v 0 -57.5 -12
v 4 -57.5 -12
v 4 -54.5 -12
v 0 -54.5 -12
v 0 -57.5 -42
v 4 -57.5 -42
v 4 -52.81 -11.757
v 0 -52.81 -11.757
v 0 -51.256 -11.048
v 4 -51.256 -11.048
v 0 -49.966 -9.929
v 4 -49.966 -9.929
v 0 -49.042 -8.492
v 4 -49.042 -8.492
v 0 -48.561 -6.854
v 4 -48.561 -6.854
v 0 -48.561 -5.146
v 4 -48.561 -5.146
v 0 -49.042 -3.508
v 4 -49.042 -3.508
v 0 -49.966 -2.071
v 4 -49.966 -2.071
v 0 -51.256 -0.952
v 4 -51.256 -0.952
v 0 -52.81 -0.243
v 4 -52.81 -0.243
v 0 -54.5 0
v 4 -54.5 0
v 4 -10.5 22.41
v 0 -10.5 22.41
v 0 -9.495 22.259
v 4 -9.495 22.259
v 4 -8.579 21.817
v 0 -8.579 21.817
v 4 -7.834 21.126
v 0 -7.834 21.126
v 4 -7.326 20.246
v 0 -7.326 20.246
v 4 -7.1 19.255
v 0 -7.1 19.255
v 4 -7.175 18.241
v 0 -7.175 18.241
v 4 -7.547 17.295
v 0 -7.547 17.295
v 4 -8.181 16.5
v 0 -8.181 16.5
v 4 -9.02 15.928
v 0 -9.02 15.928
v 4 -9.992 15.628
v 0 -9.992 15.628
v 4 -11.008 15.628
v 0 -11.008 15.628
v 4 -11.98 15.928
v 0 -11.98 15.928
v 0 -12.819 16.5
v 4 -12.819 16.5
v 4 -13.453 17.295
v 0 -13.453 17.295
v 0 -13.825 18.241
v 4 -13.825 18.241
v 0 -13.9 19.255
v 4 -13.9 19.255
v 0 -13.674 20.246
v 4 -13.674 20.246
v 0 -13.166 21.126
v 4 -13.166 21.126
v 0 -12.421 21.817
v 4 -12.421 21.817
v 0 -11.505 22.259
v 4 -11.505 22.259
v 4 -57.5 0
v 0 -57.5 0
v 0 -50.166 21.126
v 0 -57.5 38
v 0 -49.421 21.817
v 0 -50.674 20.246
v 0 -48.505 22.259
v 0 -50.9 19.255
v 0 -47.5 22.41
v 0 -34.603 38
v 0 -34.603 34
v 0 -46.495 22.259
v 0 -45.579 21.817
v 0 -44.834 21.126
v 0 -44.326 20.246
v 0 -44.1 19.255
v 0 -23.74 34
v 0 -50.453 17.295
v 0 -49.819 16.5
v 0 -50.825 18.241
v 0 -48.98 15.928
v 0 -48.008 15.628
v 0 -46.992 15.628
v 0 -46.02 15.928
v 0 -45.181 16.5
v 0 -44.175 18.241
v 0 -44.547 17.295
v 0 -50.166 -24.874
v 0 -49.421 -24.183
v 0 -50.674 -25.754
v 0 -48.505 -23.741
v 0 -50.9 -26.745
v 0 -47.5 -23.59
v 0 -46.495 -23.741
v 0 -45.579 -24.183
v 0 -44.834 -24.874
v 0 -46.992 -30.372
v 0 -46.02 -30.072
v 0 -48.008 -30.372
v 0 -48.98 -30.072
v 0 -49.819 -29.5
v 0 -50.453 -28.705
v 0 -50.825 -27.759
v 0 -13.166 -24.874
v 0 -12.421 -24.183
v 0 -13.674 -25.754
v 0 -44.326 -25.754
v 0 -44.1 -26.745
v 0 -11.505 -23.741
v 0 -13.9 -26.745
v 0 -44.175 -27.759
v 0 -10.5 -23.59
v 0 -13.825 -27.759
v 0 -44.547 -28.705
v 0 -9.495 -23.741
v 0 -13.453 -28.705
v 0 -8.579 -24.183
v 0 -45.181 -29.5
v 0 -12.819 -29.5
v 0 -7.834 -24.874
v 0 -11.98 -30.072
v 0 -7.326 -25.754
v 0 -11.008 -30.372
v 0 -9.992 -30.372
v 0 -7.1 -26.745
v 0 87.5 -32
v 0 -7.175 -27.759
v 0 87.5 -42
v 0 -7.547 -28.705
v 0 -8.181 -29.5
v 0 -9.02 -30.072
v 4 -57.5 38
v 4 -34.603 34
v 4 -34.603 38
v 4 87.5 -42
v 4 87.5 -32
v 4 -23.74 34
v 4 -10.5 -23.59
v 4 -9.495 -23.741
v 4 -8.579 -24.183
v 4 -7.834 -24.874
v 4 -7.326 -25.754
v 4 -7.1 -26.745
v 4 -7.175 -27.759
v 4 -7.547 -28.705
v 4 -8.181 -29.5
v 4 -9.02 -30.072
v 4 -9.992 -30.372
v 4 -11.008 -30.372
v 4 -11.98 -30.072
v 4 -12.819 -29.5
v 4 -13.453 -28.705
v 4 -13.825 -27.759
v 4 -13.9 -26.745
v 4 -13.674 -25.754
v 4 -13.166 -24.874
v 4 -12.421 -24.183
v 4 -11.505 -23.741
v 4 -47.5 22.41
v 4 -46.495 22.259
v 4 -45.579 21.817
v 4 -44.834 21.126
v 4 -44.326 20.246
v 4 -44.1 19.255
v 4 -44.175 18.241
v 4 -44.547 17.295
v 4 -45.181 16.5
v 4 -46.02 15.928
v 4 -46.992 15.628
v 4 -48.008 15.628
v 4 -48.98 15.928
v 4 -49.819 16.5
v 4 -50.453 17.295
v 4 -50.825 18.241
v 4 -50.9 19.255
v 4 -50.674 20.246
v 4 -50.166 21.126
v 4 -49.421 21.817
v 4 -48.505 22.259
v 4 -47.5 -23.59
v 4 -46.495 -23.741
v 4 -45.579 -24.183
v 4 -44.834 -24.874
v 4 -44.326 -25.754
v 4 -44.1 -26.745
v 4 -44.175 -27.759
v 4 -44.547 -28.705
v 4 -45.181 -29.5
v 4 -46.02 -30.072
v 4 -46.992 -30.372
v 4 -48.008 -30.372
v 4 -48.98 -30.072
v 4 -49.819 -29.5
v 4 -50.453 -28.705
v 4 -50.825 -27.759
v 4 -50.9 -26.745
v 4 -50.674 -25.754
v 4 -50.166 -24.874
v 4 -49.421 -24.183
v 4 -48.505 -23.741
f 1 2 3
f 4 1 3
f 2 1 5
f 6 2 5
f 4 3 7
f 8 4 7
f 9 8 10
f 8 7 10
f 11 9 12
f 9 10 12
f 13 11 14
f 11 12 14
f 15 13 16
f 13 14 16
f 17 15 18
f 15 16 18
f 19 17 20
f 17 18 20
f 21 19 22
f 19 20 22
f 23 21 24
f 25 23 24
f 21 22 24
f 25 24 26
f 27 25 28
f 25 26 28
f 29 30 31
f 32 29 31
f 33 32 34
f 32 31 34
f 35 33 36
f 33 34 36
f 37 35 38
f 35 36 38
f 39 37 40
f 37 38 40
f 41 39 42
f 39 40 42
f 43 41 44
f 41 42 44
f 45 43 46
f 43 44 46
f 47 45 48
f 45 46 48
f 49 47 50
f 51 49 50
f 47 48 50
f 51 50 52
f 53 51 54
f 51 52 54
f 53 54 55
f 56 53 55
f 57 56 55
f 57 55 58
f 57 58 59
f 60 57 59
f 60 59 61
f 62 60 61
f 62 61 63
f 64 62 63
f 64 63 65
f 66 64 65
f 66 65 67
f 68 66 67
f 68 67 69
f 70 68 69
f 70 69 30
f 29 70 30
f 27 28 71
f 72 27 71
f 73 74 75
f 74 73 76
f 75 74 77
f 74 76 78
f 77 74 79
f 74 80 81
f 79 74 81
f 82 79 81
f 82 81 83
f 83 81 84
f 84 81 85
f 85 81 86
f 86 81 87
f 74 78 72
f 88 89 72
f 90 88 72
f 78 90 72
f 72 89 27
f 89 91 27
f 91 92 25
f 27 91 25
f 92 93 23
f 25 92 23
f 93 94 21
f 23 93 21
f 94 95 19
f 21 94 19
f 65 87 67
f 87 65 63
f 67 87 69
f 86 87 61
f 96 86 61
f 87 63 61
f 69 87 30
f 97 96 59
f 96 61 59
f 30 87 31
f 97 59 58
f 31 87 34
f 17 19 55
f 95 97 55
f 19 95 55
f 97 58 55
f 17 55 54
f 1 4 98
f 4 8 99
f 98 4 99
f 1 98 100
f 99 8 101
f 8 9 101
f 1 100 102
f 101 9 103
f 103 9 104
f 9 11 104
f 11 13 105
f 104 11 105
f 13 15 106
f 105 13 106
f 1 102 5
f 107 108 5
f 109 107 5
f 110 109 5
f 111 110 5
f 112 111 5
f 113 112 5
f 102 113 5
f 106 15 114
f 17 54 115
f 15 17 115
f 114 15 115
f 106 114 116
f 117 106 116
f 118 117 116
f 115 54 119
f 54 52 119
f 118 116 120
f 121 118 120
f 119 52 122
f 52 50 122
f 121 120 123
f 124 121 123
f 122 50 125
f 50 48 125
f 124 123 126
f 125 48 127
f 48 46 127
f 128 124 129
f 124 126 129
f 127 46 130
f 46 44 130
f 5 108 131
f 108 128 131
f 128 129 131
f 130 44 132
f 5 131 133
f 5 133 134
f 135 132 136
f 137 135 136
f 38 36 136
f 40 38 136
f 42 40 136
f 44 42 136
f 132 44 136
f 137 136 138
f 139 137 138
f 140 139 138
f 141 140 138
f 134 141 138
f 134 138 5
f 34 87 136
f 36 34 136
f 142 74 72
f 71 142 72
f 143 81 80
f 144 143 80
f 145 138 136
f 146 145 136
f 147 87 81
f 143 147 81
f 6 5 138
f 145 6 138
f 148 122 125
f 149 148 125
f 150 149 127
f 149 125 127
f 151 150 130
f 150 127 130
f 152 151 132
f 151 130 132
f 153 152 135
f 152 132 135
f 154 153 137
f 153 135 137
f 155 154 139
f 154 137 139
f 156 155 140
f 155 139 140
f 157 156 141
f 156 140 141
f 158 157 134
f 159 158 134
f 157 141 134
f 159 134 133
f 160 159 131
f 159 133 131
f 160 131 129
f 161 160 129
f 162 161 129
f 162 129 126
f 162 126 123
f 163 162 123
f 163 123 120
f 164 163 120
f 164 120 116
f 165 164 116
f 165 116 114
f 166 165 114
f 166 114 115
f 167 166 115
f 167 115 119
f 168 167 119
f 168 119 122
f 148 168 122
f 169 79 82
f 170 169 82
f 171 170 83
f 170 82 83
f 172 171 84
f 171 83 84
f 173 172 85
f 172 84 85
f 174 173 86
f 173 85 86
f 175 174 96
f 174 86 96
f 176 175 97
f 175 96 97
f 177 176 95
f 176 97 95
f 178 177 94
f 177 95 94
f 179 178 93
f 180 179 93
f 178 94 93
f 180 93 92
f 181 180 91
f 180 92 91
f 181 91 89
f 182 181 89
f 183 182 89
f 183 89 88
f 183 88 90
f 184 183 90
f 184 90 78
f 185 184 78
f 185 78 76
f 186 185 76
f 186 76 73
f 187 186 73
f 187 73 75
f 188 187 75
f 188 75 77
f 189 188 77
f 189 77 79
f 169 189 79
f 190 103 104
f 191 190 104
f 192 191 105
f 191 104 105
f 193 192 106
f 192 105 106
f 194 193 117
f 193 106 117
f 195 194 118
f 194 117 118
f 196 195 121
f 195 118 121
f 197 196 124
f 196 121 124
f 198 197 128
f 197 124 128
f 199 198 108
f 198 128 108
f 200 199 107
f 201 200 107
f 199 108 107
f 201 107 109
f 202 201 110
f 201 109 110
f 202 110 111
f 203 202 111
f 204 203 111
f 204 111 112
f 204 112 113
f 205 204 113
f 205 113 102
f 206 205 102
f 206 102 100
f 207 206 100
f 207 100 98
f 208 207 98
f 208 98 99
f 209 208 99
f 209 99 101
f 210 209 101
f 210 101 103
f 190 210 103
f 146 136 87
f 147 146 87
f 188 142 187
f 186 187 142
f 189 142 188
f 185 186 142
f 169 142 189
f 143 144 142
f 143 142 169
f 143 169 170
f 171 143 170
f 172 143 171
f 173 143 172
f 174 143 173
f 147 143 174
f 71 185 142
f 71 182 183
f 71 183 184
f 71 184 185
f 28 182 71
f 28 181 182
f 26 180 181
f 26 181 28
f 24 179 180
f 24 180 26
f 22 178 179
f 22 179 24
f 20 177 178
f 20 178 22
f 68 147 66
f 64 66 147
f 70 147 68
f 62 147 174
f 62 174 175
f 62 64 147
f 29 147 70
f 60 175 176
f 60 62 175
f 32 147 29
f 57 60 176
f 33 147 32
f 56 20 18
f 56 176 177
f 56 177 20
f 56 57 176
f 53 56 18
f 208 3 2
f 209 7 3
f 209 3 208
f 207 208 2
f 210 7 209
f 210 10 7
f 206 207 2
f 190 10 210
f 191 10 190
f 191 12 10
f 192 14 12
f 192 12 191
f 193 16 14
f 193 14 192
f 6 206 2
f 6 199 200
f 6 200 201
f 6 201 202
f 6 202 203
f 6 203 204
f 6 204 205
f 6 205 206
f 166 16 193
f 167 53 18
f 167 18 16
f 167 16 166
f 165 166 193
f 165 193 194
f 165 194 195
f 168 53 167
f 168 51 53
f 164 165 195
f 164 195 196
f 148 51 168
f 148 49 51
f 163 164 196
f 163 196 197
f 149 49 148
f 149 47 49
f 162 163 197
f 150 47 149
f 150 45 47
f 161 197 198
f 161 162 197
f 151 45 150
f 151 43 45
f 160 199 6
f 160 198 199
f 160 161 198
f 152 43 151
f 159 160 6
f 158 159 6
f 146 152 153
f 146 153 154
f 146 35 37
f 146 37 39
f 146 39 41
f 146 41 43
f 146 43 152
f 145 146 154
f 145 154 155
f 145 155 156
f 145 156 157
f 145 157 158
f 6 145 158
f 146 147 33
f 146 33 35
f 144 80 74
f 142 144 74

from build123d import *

# Parameters (mm, degrees)
BOSS_EXTRUDE1_DEPTH = 4
CUT_EXTRUDE1_REACH  = 99.14
SKETCH3_R           = 3.41
CUT_EXTRUDE2_REACH  = 99.14
SKETCH4_R           = 3.41
CUT_EXTRUDE4_REACH  = 99.14


with BuildPart() as part:
    # Sketch1 → Boss-Extrude1 (new body)
    with BuildSketch(Plane(origin=(0, 0, 0), x_dir=(0, 0, -1), z_dir=(1, 0, 0))):
        Polygon((-38, -57.5), (42, -57.5), (42, 87.5), (32, 87.5), (-34, -23.740343039), (-34, -34.602813771), (-38, -34.602813771), align=None)
    extrude(amount=BOSS_EXTRUDE1_DEPTH)

    # Sketch3 → Cut-Extrude1 (cut, up to next)
    with BuildSketch(Plane.ZY, mode=Mode.PRIVATE) as cut_extrude1_sk1:
        with Locations((-27, -10.5)):
            Circle(SKETCH3_R)
    cut_extrude1_tool1 = extrude(cut_extrude1_sk1.sketch, amount=-CUT_EXTRUDE1_REACH, mode=Mode.PRIVATE) & part.part
    # Sketch3 → Cut-Extrude1 (cut, up to next)
    with BuildSketch(Plane.ZY, mode=Mode.PRIVATE) as cut_extrude1_sk2:
        with Locations((19, -10.5)):
            Circle(SKETCH3_R)
    cut_extrude1_tool2 = extrude(cut_extrude1_sk2.sketch, amount=-CUT_EXTRUDE1_REACH, mode=Mode.PRIVATE) & part.part
    add(cut_extrude1_tool1.solids().sort_by_distance((0, -10.5, -27))[0], mode=Mode.SUBTRACT)
    add(cut_extrude1_tool2.solids().sort_by_distance((0, -10.5, 19))[0], mode=Mode.SUBTRACT)

    # Sketch4 → Cut-Extrude2 (cut, up to next)
    with BuildSketch(Plane.ZY, mode=Mode.PRIVATE) as cut_extrude2_sk1:
        with Locations((-27, -47.5)):
            Circle(SKETCH4_R)
    cut_extrude2_tool1 = extrude(cut_extrude2_sk1.sketch, amount=-CUT_EXTRUDE2_REACH, mode=Mode.PRIVATE) & part.part
    # Sketch4 → Cut-Extrude2 (cut, up to next)
    with BuildSketch(Plane.ZY, mode=Mode.PRIVATE) as cut_extrude2_sk2:
        with Locations((19, -47.5)):
            Circle(SKETCH4_R)
    cut_extrude2_tool2 = extrude(cut_extrude2_sk2.sketch, amount=-CUT_EXTRUDE2_REACH, mode=Mode.PRIVATE) & part.part
    add(cut_extrude2_tool1.solids().sort_by_distance((0, -47.5, -27))[0], mode=Mode.SUBTRACT)
    add(cut_extrude2_tool2.solids().sort_by_distance((0, -47.5, 19))[0], mode=Mode.SUBTRACT)

    # Sketch6 → Cut-Extrude4 (cut, up to next)
    with BuildSketch(Plane(origin=(4, 0, 0), x_dir=(0, 0, -1), z_dir=(1, 0, 0)), mode=Mode.PRIVATE) as cut_extrude4_sk1:
        with BuildLine():
            Line((0, -54.5), (0, -57.5))
            Line((0, -57.5), (12, -57.5))
            Line((12, -57.5), (12, -54.5))
            ThreePointArc((12, -54.5), (6, -48.5), (0, -54.5))
        make_face()
    cut_extrude4_tool1 = extrude(cut_extrude4_sk1.sketch, amount=-CUT_EXTRUDE4_REACH, mode=Mode.PRIVATE) & part.part
    add(cut_extrude4_tool1.solids().sort_by_distance((4, -53.527539, -6))[0], mode=Mode.SUBTRACT)


solid = part.part
